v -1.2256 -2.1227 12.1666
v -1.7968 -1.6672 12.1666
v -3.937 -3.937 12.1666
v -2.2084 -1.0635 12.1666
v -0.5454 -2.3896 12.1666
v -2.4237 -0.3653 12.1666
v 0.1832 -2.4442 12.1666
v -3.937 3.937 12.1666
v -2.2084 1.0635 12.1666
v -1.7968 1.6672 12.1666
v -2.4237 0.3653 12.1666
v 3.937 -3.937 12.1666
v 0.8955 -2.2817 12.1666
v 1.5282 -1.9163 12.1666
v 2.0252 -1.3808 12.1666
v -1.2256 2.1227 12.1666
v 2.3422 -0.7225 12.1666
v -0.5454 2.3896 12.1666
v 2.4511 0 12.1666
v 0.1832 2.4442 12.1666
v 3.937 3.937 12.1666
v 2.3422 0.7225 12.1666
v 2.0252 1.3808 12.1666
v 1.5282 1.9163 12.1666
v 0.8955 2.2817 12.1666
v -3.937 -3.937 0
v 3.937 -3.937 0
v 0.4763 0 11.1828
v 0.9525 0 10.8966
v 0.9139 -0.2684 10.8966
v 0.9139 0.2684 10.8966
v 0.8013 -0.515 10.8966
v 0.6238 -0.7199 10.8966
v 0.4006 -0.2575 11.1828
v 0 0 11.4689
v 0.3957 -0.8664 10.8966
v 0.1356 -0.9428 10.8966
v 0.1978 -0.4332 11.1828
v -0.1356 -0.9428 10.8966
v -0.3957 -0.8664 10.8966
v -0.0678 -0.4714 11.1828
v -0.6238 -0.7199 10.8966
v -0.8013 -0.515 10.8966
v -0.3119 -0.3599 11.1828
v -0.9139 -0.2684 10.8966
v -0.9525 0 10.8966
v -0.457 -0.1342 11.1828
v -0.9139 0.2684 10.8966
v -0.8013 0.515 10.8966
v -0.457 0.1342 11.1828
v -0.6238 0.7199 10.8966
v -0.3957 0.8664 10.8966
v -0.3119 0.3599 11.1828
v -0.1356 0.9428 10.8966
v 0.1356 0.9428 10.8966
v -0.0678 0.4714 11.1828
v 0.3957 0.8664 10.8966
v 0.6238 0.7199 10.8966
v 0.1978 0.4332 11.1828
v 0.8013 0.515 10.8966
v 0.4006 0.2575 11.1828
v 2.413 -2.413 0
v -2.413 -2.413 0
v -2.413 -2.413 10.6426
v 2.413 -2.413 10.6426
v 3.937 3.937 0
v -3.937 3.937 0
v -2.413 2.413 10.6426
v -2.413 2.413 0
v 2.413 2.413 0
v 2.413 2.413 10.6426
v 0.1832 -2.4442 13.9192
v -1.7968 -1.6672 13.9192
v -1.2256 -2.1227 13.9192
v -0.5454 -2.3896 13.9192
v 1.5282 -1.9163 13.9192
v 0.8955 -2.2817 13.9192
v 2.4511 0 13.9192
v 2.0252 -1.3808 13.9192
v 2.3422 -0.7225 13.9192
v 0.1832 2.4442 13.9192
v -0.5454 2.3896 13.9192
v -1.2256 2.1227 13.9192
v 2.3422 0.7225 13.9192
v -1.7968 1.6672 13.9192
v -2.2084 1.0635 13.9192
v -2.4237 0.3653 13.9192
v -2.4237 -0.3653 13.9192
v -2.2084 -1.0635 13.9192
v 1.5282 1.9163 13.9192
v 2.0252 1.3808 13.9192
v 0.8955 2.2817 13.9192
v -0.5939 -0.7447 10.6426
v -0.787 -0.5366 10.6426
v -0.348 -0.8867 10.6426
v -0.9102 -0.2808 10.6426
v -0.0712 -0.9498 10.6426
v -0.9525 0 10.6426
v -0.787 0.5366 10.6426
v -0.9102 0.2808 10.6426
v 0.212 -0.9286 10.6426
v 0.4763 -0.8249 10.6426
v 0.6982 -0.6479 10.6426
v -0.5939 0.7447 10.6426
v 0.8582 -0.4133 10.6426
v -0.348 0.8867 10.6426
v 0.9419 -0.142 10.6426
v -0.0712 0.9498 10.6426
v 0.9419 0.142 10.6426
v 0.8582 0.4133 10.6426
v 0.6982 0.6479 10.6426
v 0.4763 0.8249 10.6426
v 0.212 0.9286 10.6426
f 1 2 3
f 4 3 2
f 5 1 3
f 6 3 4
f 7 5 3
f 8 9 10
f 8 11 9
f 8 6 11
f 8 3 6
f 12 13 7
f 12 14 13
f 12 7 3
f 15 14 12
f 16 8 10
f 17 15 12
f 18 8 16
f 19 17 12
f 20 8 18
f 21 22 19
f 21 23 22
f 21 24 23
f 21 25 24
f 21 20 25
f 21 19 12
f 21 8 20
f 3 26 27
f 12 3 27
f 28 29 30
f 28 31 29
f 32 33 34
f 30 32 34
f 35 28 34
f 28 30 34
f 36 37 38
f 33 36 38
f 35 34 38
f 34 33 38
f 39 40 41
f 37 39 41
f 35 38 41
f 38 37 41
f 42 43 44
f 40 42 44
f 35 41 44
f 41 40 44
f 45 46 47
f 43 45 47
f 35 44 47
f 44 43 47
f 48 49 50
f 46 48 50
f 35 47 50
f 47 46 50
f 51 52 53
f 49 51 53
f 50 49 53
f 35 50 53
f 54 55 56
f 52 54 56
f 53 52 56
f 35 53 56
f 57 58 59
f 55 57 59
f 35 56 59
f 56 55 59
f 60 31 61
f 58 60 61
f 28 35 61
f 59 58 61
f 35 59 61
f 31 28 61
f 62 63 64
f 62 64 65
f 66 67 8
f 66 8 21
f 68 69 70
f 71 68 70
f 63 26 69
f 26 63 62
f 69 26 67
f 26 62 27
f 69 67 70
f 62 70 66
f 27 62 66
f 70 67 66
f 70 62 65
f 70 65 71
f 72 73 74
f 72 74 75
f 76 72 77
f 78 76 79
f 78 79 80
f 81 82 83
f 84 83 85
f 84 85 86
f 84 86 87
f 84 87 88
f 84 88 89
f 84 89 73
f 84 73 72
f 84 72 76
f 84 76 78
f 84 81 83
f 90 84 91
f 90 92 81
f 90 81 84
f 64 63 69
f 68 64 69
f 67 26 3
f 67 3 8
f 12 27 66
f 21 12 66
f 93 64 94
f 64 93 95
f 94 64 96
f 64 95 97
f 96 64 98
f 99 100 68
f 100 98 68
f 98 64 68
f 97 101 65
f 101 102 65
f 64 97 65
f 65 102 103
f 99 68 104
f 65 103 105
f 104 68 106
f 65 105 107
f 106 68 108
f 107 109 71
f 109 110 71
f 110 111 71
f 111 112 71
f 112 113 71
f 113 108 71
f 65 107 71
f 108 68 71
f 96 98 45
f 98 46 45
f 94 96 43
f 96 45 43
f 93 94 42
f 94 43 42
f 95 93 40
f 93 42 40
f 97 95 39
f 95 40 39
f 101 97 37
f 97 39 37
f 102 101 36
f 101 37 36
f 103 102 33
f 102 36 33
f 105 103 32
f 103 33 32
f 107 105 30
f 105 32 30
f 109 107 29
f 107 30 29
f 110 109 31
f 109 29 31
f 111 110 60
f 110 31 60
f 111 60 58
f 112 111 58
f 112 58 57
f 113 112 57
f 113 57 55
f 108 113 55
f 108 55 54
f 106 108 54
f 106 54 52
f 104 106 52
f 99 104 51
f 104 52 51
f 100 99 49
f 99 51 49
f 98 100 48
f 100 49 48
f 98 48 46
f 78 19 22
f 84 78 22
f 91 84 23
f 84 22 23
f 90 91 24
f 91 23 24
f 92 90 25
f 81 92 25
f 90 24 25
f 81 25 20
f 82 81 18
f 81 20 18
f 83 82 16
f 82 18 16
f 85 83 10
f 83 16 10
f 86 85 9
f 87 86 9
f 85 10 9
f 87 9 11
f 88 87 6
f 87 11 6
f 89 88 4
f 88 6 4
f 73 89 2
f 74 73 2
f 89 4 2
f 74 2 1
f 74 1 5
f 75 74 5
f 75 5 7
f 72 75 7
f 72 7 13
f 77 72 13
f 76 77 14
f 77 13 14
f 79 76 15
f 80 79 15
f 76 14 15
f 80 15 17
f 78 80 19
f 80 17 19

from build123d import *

# Parameters (mm, degrees)
F0_W     = 7.874
F0_H     = 7.874
F1_DEPTH = 12.1666
F2_T     = -1.524
F4_D     = 1.905
F4_DEPTH = 0.254
F4_TIP   = 0.5723197396
F5_R     = 2.4511
F6_DEPTH = 1.7526


with BuildPart() as f1:
    # F0 (on Top) → F1 (new body)
    with BuildSketch(Plane.XY):
        Rectangle(F0_W, F0_H)
    extrude(amount=F1_DEPTH)

    # F2
    f2_openings = [f1.faces().sort_by_distance(p)[0] for p in [
        (0, 0, 0),
    ]]
    offset(amount=F2_T, openings=f2_openings)

    # F4
    with Locations(Plane(origin=(0, 0, 10.6426), x_dir=(1, 0, 0), z_dir=(0, 0, -1))):
        with Locations((0, 0)):
            Hole(F4_D / 2, depth=F4_DEPTH)
            with Locations((0, 0, -(F4_DEPTH + F4_TIP / 2))):  # 118° drill point
                Cone(0, F4_D / 2, F4_TIP, mode=Mode.SUBTRACT)

    # F5 (on face) → F6 (join)
    with BuildSketch(Plane.XY.offset(12.1666)):
        Circle(F5_R)
    extrude(amount=F6_DEPTH)


solid = f1.part
